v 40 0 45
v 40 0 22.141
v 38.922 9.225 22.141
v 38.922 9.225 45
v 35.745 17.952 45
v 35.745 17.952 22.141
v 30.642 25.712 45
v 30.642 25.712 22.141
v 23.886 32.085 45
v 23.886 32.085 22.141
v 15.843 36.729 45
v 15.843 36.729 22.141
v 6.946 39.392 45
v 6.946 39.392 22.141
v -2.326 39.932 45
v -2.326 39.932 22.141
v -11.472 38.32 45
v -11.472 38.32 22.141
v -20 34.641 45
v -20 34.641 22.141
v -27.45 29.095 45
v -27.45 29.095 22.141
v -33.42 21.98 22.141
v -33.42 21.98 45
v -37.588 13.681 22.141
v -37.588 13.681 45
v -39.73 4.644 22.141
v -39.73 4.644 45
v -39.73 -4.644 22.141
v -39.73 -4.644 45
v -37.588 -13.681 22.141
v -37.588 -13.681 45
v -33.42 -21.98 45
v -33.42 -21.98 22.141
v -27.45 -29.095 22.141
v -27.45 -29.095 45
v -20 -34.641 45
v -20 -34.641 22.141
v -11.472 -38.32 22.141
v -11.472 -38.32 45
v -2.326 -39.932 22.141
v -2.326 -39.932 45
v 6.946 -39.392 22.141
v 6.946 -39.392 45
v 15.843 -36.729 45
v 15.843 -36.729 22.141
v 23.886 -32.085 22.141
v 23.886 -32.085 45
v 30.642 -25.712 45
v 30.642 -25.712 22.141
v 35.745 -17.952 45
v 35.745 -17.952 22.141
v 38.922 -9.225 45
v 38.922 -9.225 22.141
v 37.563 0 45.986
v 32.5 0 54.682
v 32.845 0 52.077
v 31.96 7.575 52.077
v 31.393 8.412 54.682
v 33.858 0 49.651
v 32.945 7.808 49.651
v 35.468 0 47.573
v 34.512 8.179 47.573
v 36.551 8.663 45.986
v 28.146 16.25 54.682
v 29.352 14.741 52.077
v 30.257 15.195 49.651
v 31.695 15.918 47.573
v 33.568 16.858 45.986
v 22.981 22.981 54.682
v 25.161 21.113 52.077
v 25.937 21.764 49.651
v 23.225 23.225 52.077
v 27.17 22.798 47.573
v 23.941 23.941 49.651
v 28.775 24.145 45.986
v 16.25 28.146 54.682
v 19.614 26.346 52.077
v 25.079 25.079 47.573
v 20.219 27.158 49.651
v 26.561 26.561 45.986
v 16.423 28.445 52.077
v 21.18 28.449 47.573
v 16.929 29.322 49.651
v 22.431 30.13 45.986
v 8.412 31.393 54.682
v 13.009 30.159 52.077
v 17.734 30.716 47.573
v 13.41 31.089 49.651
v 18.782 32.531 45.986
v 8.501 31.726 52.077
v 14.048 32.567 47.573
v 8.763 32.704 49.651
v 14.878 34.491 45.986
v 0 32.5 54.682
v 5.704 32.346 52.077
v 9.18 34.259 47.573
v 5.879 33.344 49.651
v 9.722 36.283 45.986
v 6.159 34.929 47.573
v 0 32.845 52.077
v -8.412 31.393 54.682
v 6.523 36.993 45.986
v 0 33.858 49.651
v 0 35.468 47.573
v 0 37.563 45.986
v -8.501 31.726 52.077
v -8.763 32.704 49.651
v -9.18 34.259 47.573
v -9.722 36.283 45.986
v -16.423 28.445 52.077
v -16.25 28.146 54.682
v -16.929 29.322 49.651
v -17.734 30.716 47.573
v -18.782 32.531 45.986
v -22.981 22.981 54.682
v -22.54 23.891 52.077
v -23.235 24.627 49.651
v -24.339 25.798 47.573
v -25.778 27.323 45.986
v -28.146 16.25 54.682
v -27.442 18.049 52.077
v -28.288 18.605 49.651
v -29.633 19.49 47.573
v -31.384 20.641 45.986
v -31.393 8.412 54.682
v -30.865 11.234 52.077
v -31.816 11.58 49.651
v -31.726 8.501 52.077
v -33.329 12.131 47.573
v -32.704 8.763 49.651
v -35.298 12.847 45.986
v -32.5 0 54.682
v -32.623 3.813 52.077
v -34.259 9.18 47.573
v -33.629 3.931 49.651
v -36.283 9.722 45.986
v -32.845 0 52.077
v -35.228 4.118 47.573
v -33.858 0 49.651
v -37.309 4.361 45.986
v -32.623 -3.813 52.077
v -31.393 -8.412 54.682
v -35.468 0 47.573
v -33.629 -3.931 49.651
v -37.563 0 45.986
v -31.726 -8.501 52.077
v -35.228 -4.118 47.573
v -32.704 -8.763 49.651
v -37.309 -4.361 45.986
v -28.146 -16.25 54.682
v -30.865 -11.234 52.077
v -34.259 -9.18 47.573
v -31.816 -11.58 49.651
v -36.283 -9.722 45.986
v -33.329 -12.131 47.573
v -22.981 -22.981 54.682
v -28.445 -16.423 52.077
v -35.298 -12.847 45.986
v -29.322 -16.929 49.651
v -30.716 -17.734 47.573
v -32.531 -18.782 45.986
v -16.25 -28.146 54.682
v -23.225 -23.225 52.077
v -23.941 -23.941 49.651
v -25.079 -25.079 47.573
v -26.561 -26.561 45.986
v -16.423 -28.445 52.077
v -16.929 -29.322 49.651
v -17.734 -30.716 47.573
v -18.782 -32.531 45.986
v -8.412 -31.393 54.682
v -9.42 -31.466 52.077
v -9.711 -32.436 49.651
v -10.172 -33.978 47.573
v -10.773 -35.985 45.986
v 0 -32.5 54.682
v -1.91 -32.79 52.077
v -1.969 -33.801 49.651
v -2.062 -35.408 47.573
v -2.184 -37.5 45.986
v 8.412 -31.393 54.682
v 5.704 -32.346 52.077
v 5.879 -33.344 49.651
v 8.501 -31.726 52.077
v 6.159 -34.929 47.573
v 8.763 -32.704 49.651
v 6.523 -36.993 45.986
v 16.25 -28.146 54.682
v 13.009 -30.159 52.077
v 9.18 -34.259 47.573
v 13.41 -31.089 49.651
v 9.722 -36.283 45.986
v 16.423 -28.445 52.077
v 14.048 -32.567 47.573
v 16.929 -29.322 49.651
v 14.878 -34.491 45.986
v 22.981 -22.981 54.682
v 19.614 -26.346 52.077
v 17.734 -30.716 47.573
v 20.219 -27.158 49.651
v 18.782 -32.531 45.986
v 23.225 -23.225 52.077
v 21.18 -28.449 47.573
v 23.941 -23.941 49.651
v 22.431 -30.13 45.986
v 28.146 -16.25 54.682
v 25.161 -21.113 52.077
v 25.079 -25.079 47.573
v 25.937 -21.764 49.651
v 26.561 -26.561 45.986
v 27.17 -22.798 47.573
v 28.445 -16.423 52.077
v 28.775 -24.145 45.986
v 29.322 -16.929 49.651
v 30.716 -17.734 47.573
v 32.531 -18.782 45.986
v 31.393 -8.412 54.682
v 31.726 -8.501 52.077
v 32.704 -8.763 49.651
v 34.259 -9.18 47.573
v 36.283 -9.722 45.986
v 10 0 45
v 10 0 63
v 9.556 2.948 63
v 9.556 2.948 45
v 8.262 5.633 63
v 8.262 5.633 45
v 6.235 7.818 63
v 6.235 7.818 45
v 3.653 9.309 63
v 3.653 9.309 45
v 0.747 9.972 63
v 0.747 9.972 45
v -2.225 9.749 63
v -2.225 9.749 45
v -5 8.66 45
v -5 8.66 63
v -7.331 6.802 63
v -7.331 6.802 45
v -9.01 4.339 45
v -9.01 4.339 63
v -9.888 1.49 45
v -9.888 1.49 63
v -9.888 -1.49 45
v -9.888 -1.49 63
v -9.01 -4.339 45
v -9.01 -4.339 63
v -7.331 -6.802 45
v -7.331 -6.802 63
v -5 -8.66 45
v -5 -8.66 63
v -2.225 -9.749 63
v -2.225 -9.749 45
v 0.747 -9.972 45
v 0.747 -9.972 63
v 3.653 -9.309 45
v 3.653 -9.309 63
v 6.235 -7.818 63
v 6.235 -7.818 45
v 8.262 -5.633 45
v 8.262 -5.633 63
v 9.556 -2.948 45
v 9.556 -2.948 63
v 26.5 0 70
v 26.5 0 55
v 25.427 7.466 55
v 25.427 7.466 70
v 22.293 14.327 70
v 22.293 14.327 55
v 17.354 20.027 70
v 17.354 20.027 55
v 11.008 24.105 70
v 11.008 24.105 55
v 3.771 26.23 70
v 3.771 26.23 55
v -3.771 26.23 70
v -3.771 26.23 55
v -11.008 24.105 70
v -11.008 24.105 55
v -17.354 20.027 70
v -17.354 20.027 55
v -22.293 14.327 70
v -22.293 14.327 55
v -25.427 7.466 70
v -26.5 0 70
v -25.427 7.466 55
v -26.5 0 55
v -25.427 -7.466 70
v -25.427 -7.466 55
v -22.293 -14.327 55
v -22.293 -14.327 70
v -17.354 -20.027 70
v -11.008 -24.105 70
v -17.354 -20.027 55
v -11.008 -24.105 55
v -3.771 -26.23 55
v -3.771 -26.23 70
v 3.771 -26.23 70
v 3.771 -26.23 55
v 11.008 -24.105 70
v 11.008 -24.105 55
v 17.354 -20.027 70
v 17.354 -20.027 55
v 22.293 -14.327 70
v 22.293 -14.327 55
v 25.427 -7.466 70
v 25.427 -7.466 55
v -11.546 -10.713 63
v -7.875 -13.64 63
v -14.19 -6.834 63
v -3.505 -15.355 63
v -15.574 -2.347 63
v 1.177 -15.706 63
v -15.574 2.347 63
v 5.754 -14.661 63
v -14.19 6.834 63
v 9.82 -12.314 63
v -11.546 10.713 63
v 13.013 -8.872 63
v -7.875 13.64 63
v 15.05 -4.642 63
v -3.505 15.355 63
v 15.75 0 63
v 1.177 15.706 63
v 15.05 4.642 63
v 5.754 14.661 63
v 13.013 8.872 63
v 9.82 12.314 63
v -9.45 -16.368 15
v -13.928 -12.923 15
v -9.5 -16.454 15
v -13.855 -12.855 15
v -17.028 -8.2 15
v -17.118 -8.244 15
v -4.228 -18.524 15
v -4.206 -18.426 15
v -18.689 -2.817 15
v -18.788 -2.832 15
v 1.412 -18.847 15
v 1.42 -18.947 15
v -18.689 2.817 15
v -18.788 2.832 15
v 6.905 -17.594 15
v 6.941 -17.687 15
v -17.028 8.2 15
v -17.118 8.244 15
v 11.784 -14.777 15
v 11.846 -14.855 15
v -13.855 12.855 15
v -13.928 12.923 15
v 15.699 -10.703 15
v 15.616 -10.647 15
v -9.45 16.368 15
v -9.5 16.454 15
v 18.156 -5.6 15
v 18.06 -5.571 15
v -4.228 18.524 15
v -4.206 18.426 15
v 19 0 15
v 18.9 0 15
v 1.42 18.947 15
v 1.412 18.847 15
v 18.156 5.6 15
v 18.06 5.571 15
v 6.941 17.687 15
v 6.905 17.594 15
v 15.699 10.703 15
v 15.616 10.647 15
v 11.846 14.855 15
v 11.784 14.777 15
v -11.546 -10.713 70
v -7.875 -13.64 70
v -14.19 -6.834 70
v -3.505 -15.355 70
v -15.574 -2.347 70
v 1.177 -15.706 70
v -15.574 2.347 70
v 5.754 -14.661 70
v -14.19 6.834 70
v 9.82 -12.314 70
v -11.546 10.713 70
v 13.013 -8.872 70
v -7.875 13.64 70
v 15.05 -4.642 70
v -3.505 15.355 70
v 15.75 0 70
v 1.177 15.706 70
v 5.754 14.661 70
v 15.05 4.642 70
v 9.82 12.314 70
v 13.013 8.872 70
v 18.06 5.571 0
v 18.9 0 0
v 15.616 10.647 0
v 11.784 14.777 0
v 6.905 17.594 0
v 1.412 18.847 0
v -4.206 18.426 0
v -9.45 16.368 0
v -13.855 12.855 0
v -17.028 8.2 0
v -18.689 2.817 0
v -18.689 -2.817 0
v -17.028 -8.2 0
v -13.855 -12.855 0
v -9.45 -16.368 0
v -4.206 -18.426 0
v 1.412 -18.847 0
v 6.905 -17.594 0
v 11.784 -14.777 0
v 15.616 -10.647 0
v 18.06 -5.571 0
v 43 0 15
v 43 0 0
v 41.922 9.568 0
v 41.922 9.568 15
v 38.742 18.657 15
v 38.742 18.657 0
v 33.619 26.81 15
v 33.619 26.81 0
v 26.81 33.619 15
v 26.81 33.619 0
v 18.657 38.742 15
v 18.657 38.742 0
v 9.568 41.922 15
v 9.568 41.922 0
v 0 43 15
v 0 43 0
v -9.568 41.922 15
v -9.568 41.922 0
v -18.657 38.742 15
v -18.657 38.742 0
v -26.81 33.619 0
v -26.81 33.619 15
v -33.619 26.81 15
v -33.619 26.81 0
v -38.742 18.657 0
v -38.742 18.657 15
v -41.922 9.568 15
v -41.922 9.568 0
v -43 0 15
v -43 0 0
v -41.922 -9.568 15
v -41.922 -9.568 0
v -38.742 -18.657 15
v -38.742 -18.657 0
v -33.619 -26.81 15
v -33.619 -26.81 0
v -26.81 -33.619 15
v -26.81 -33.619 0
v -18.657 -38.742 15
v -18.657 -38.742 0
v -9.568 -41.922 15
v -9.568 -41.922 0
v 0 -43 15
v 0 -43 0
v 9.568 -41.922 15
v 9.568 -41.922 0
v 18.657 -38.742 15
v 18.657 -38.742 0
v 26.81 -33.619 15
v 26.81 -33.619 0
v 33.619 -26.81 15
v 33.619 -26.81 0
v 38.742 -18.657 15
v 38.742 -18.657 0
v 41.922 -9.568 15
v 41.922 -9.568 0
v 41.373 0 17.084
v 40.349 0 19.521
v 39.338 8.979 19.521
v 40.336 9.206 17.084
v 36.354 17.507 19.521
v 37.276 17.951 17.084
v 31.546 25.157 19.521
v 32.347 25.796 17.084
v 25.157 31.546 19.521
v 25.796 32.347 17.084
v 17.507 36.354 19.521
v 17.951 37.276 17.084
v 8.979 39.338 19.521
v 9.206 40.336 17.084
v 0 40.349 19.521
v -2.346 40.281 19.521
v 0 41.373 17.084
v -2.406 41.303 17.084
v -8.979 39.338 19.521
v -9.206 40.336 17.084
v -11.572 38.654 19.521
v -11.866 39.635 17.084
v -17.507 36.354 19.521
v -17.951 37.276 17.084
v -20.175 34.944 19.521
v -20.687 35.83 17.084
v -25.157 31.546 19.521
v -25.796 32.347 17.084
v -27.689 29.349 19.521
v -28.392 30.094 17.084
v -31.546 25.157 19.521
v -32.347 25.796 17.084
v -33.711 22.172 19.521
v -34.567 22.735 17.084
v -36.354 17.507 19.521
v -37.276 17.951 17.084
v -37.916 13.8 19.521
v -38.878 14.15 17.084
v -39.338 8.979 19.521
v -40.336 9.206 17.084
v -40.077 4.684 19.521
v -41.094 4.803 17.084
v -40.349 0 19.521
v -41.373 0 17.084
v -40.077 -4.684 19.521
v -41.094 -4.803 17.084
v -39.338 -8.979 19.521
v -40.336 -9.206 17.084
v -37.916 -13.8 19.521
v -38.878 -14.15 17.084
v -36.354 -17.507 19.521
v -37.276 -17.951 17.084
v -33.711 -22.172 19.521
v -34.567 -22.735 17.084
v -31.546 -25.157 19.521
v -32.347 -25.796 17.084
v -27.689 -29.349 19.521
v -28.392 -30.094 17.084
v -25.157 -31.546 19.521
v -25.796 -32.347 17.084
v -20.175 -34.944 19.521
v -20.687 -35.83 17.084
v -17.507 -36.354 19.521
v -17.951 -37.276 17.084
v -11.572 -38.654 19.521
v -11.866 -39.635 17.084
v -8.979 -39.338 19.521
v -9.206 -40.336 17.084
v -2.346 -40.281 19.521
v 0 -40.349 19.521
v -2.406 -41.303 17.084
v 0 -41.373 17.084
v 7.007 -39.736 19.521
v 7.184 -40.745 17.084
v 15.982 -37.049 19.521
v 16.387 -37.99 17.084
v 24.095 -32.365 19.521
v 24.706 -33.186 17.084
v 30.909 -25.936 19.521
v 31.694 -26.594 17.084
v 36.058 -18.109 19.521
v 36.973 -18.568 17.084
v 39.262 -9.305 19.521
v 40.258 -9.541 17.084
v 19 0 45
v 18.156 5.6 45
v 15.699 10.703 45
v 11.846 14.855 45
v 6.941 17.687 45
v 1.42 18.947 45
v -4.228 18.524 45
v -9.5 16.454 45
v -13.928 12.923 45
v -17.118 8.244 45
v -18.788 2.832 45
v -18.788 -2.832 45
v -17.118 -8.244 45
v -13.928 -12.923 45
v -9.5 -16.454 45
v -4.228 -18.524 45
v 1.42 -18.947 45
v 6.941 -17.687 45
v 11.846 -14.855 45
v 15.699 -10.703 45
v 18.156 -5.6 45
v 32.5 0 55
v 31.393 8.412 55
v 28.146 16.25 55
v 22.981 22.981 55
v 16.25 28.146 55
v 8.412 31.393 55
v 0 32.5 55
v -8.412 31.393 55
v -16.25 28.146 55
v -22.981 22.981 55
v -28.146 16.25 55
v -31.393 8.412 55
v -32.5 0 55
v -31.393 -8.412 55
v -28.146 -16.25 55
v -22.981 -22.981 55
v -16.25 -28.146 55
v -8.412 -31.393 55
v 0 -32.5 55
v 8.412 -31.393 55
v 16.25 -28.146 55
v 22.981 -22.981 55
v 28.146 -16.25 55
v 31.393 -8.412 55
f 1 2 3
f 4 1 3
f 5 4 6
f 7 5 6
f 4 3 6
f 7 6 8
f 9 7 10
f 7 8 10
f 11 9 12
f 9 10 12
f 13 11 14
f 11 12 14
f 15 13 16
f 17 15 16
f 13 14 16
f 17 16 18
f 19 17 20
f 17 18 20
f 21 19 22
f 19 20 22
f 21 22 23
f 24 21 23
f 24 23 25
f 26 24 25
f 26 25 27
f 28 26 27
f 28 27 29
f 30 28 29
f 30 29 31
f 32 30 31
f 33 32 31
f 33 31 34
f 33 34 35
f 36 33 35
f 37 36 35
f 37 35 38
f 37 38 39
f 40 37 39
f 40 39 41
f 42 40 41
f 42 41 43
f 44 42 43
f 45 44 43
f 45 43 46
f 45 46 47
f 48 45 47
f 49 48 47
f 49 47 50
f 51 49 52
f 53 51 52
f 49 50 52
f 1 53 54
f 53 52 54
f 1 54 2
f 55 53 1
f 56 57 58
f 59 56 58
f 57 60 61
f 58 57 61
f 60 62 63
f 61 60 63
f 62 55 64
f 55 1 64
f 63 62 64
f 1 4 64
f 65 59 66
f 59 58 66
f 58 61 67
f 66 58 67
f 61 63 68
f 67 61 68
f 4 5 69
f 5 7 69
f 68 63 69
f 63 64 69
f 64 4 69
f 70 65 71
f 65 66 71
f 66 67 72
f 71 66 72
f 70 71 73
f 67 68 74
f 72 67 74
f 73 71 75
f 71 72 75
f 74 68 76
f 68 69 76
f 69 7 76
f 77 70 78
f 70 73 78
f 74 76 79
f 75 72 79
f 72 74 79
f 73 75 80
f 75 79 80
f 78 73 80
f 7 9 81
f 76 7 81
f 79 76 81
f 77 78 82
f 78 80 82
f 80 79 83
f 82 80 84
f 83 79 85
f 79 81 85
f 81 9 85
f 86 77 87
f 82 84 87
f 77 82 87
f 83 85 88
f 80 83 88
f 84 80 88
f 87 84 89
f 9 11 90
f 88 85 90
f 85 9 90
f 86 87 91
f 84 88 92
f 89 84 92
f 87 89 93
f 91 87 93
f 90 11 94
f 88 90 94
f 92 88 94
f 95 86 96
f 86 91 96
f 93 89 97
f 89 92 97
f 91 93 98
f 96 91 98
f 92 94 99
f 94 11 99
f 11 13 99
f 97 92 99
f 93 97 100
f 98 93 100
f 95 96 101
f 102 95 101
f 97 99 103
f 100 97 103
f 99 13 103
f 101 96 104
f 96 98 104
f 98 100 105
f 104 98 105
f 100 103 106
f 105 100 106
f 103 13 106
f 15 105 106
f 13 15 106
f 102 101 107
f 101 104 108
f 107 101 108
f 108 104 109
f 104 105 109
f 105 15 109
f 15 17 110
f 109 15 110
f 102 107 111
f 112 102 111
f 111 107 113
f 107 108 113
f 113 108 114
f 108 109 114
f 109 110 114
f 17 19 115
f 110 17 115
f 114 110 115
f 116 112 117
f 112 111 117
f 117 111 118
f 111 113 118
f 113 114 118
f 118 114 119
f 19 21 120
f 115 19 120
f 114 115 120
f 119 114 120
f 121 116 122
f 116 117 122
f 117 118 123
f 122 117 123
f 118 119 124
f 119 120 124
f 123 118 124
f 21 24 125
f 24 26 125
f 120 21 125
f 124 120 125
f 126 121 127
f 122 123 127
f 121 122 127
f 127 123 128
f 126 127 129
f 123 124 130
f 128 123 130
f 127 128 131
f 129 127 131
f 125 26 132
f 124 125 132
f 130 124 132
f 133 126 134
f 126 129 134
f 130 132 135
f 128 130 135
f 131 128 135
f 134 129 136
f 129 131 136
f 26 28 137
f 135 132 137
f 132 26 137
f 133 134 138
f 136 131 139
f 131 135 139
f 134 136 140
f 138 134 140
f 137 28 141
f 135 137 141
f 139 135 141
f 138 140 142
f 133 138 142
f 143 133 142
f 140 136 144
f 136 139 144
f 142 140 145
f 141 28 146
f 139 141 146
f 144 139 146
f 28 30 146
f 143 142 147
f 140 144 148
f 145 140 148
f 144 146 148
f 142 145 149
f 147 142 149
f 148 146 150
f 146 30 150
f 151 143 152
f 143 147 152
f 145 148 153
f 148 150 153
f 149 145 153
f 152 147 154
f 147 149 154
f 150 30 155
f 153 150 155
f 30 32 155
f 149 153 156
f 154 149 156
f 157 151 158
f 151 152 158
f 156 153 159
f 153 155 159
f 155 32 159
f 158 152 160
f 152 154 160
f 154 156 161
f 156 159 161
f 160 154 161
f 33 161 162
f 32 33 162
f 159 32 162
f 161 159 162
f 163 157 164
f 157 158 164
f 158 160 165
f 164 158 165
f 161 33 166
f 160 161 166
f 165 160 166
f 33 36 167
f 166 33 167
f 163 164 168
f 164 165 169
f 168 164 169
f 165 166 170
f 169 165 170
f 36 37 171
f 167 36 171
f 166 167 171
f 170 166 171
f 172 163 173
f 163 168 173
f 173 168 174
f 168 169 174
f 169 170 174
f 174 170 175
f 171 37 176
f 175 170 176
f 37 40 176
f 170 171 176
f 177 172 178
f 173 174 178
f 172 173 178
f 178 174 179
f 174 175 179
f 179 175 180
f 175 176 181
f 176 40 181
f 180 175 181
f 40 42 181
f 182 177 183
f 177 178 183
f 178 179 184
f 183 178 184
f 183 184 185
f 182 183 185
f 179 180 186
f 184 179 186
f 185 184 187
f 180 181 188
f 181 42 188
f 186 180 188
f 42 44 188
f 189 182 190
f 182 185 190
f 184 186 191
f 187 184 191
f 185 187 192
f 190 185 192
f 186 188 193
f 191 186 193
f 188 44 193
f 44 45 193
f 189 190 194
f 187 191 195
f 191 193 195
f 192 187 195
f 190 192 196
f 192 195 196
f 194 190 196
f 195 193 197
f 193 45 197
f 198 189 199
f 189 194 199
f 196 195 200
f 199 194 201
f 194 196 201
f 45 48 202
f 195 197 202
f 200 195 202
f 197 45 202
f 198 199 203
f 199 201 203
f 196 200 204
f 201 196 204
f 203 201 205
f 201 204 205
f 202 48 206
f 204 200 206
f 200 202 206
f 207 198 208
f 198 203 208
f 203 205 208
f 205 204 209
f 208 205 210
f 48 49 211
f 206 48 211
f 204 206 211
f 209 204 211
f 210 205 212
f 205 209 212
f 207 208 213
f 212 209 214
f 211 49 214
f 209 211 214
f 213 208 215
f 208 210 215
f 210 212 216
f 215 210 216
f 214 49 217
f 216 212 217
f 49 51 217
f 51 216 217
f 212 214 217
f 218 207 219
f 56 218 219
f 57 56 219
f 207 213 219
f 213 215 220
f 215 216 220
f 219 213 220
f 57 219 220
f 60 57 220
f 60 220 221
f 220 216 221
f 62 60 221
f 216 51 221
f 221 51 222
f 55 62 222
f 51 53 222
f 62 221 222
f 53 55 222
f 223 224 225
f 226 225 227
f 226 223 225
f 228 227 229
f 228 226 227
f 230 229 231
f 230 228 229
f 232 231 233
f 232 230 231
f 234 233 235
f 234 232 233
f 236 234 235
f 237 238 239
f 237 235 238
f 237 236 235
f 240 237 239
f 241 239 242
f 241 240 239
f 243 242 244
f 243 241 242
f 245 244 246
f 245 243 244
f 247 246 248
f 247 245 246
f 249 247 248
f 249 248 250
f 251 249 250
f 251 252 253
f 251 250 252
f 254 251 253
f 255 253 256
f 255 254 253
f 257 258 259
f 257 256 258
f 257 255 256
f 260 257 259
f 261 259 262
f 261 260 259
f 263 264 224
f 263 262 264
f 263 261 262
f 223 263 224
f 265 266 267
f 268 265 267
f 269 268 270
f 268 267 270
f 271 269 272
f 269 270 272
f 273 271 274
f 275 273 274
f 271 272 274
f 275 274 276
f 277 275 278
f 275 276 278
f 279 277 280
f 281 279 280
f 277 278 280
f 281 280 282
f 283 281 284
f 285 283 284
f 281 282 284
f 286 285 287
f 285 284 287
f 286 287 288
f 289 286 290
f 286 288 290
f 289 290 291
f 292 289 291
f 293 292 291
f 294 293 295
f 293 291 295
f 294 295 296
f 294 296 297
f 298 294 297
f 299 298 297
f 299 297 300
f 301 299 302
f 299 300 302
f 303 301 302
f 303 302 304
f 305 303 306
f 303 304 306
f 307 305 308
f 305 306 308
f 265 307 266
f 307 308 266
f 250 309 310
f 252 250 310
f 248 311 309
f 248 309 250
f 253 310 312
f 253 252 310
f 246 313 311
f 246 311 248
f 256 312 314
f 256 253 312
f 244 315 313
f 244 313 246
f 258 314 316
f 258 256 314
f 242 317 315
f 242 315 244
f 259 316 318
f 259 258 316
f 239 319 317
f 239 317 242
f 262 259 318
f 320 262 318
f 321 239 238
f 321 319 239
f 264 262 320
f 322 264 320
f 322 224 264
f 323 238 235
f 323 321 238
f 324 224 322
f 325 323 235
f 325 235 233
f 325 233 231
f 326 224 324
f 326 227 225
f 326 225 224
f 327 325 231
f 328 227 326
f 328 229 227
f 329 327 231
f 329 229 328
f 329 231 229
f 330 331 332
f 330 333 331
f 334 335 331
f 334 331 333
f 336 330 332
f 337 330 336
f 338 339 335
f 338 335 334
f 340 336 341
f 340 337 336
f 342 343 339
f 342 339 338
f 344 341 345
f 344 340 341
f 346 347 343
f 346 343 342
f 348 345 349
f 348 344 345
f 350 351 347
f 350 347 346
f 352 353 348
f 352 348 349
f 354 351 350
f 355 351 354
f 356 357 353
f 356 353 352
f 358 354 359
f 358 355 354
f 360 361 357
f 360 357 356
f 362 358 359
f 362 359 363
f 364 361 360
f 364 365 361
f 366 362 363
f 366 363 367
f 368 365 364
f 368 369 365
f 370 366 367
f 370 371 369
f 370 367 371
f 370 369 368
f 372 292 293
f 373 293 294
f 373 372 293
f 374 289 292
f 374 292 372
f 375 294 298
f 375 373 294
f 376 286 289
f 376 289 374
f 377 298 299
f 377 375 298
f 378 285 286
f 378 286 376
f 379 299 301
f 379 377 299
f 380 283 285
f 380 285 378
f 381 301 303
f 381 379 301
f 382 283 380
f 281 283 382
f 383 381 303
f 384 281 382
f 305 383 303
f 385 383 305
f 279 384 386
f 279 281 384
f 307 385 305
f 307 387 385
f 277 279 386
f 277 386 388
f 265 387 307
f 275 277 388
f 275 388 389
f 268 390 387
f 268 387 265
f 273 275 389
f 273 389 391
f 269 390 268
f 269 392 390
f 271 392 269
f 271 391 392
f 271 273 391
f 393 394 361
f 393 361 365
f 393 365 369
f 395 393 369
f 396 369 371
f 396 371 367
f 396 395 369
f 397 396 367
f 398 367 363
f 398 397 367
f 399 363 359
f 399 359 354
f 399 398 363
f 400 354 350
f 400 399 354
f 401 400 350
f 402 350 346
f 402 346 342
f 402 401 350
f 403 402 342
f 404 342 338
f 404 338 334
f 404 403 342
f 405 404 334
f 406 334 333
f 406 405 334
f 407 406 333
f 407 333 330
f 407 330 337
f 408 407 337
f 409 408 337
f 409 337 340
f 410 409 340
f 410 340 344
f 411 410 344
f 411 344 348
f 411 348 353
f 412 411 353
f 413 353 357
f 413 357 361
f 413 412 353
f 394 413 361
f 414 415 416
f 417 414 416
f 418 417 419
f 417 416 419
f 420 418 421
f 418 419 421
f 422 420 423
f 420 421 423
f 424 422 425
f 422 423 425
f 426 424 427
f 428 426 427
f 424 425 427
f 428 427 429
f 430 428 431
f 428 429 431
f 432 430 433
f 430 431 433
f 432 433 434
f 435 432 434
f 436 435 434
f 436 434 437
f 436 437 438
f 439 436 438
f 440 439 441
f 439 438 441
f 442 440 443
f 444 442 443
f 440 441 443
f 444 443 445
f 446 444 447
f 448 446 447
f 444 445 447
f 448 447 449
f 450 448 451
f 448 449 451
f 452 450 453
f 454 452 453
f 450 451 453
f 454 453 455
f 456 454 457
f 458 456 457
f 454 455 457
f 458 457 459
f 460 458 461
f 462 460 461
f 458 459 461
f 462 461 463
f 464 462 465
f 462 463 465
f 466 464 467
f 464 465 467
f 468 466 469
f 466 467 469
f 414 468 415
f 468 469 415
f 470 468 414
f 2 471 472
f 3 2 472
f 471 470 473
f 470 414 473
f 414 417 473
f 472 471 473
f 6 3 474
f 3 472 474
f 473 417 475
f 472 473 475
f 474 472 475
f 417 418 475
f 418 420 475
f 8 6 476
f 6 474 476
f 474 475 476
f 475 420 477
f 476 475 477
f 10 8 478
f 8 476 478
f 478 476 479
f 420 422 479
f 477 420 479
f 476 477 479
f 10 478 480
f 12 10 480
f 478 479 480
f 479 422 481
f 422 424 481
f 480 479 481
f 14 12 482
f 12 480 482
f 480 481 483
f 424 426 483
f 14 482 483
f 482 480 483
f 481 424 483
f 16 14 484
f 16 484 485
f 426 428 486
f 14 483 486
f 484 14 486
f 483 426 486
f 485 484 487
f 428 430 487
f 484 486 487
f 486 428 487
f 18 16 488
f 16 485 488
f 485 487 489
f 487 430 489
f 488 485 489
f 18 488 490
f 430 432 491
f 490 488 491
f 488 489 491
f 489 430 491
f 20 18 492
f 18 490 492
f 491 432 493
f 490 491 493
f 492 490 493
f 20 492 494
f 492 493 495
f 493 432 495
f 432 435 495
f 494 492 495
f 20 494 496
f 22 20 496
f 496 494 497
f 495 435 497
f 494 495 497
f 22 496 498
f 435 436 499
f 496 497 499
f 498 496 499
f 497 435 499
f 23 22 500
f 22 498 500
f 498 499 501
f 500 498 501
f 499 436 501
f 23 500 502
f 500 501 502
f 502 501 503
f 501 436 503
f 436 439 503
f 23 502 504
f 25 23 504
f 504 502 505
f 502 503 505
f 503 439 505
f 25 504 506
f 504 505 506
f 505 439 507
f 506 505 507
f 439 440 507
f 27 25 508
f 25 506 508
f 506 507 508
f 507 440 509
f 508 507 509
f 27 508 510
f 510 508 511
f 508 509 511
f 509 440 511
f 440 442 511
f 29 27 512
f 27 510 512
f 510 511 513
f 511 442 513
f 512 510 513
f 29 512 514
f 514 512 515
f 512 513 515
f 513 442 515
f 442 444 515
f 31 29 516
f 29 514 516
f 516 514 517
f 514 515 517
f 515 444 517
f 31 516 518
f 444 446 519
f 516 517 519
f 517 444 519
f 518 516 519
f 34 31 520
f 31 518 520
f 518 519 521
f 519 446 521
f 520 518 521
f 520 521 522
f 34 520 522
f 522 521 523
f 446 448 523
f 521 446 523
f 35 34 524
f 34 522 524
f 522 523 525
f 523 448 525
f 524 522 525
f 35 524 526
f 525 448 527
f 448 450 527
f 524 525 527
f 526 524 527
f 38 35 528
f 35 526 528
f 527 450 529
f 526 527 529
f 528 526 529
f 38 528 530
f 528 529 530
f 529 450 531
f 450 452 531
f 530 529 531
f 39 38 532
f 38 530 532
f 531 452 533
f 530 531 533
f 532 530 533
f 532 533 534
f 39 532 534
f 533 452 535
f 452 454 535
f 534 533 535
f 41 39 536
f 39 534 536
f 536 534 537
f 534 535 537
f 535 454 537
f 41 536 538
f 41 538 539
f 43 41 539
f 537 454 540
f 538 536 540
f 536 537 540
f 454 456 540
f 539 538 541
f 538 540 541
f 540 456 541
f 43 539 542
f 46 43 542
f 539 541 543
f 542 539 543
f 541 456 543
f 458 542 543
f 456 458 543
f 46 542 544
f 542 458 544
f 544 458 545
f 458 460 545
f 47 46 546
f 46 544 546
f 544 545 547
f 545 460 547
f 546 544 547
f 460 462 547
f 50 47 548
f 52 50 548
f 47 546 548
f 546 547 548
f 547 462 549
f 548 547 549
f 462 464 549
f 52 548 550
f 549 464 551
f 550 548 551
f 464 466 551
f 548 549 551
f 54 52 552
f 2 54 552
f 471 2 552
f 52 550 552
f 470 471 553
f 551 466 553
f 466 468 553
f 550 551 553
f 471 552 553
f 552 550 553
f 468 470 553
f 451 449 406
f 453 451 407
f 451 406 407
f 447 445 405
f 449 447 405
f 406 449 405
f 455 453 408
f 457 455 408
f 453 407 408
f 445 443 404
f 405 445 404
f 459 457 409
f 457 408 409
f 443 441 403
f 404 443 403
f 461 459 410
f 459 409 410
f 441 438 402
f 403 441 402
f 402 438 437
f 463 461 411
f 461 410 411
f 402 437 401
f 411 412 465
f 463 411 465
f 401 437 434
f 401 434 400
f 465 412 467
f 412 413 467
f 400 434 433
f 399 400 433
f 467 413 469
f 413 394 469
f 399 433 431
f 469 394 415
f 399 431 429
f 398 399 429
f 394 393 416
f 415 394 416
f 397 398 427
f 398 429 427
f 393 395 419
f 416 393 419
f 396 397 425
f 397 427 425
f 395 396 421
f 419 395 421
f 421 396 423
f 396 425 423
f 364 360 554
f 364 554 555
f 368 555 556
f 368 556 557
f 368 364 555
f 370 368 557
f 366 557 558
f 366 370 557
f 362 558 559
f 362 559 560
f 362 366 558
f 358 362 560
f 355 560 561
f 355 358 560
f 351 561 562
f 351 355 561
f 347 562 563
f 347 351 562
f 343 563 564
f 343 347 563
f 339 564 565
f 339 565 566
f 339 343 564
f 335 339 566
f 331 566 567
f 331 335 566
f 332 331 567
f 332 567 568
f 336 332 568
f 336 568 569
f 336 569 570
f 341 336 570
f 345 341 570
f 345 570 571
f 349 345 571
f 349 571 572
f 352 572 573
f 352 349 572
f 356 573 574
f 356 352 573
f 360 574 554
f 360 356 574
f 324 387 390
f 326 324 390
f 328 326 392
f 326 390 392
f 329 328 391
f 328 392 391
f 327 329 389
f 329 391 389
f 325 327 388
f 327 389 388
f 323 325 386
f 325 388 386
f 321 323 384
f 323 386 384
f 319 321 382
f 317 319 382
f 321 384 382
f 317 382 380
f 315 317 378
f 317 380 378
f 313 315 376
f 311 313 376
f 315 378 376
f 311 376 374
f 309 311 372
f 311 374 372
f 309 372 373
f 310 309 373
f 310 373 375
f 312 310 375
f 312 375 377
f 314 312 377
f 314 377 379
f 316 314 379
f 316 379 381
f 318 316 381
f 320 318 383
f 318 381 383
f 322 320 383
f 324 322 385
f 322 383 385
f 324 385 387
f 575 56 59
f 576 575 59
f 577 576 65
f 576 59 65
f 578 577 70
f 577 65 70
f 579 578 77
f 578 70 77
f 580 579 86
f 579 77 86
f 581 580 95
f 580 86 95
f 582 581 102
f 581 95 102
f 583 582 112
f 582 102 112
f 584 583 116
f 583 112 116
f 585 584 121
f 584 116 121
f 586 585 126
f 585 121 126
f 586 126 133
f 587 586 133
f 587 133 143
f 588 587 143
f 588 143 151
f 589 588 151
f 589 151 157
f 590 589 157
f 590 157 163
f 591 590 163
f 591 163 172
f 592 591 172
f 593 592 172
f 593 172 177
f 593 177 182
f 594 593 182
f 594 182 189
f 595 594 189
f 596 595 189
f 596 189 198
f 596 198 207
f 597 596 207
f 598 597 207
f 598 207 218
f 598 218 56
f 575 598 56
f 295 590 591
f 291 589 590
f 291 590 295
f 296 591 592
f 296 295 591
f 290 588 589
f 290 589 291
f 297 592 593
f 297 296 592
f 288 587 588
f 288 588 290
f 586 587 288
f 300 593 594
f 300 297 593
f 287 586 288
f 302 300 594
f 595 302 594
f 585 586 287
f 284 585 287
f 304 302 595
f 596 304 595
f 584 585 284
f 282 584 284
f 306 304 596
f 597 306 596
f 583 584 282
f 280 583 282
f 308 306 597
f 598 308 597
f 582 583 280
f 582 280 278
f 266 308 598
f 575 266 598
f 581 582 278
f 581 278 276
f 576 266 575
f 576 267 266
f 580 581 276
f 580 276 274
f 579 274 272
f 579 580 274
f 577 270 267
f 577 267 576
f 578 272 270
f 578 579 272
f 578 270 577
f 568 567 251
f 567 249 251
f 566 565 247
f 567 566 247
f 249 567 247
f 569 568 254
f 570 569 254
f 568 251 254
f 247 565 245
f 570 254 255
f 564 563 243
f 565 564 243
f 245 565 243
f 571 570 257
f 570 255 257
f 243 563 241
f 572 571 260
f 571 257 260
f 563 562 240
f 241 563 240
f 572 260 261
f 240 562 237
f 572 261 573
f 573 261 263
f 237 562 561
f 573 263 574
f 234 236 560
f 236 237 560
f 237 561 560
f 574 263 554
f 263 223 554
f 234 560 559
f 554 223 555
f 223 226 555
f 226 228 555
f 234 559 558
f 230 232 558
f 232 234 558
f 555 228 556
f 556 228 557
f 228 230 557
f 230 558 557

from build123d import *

# Parameters (mm, degrees)
SKETCH_1_R          = 43
SKETCH_1_R_2        = 18.9
EXTRUDE_1_DEPTH     = 15
SKETCH_3_R          = 40
SKETCH_3_R_2        = 19
EXTRUDE_2_DEPTH     = 30
SKETCH_7_R          = 32.5
SKETCH_7_R_2        = 10
EXTRUDE_3_DEPTH     = 10
FILLET_3_R          = 10
SKETCH_9_R          = 16
SKETCH_9_R_2        = 10
EXTRUDE_6_DEPTH     = 7
SKETCH_10_R         = 26.5
SKETCH_10_R_2       = 10
EXTRUDE_7_DEPTH     = 15
SKETCH_12_R         = 15.75
CUT_EXTRUDE_8_DEPTH = 7
FILLET_4_R          = 10


with BuildPart() as part:
    # Эскиз1 → Вытянуть1 (new body)
    with BuildSketch(Plane.XY):
        Circle(SKETCH_1_R)
        Circle(SKETCH_1_R_2, mode=Mode.SUBTRACT)
    extrude(amount=EXTRUDE_1_DEPTH)

    # Эскиз3 → Вытянуть2 (add)
    with BuildSketch(Plane.XY.offset(15)):
        Circle(SKETCH_3_R)
        Circle(SKETCH_3_R_2, mode=Mode.SUBTRACT)
    extrude(amount=EXTRUDE_2_DEPTH)

    # Эскиз7 → Вытянуть3 (add)
    with BuildSketch(Plane.XY.offset(45)):
        Circle(SKETCH_7_R)
        Circle(SKETCH_7_R_2, mode=Mode.SUBTRACT)
    extrude(amount=EXTRUDE_3_DEPTH)

    # Скругление3
    # the kernel refuses this fillet: 10 mm, written as the material it adds along each edge
    with BuildSketch(Plane(origin=(0, 0, 15), x_dir=(1, 0, 0), z_dir=(0, -1, 0))) as fillet_3_piece_1:
        with BuildLine():
            CenterArc((50, 7.141428429), FILLET_3_R, 180, 45.572995999)
            Line((40, 7.141428429), (39.8, 7.141428429))
            Line((39.8, 7.141428429), (39.8, 0))
            Line((39.8, 0), (40, -0.2))
            ThreePointArc((40, -0.2), (41.5, -0.2), (42.86, -0.142828569))
            Line((42.86, -0.142828569), (43, 0))
        make_face()
    revolve(axis=Axis((0, 0, 15), (0, 0, 1)))



with BuildPart() as body_2:
    # Эскиз9 → Вытянуть6 (new body)
    with BuildSketch(Plane.XY.offset(48)):
        Circle(SKETCH_9_R)
        Circle(SKETCH_9_R_2, mode=Mode.SUBTRACT)
    extrude(amount=EXTRUDE_6_DEPTH)


with BuildPart() as part_1:
    add(part.part)

    add(body_2.part)  # Вытянуть7 merges body 2
    # Эскиз10 → Вытянуть7 (add)
    with BuildSketch(Plane.XY.offset(55)):
        Circle(SKETCH_10_R)
        Circle(SKETCH_10_R_2, mode=Mode.SUBTRACT)
    extrude(amount=EXTRUDE_7_DEPTH)

    # Эскиз12 → Вытянуть8 (cut)
    with BuildSketch(Plane.XY.offset(70)):
        Circle(SKETCH_12_R)
    extrude(amount=-CUT_EXTRUDE_8_DEPTH, mode=Mode.SUBTRACT)

    # Скругление4
    # the kernel refuses this fillet: 10 mm, written as the material it adds along each edge
    with BuildSketch(Plane(origin=(0, 0, 45), x_dir=(1, 0, 0), z_dir=(0, -1, 0))) as fillet_4_piece_1:
        with BuildLine():
            CenterArc((42.5, 9.682458366), FILLET_4_R, 180, 75.522487814)
            Line((32.5, 9.682458366), (32.3, 9.682458366))
            Line((32.3, 9.682458366), (32.3, 0))
            Line((32.3, 0), (32.5, -0.2))
            ThreePointArc((32.5, -0.2), (36.25, -0.2), (39.95, -0.193649167))
            Line((39.95, -0.193649167), (40, 0))
        make_face()
    revolve(axis=Axis((0, 0, 45), (0, 0, 1)))


solid = part_1.part
